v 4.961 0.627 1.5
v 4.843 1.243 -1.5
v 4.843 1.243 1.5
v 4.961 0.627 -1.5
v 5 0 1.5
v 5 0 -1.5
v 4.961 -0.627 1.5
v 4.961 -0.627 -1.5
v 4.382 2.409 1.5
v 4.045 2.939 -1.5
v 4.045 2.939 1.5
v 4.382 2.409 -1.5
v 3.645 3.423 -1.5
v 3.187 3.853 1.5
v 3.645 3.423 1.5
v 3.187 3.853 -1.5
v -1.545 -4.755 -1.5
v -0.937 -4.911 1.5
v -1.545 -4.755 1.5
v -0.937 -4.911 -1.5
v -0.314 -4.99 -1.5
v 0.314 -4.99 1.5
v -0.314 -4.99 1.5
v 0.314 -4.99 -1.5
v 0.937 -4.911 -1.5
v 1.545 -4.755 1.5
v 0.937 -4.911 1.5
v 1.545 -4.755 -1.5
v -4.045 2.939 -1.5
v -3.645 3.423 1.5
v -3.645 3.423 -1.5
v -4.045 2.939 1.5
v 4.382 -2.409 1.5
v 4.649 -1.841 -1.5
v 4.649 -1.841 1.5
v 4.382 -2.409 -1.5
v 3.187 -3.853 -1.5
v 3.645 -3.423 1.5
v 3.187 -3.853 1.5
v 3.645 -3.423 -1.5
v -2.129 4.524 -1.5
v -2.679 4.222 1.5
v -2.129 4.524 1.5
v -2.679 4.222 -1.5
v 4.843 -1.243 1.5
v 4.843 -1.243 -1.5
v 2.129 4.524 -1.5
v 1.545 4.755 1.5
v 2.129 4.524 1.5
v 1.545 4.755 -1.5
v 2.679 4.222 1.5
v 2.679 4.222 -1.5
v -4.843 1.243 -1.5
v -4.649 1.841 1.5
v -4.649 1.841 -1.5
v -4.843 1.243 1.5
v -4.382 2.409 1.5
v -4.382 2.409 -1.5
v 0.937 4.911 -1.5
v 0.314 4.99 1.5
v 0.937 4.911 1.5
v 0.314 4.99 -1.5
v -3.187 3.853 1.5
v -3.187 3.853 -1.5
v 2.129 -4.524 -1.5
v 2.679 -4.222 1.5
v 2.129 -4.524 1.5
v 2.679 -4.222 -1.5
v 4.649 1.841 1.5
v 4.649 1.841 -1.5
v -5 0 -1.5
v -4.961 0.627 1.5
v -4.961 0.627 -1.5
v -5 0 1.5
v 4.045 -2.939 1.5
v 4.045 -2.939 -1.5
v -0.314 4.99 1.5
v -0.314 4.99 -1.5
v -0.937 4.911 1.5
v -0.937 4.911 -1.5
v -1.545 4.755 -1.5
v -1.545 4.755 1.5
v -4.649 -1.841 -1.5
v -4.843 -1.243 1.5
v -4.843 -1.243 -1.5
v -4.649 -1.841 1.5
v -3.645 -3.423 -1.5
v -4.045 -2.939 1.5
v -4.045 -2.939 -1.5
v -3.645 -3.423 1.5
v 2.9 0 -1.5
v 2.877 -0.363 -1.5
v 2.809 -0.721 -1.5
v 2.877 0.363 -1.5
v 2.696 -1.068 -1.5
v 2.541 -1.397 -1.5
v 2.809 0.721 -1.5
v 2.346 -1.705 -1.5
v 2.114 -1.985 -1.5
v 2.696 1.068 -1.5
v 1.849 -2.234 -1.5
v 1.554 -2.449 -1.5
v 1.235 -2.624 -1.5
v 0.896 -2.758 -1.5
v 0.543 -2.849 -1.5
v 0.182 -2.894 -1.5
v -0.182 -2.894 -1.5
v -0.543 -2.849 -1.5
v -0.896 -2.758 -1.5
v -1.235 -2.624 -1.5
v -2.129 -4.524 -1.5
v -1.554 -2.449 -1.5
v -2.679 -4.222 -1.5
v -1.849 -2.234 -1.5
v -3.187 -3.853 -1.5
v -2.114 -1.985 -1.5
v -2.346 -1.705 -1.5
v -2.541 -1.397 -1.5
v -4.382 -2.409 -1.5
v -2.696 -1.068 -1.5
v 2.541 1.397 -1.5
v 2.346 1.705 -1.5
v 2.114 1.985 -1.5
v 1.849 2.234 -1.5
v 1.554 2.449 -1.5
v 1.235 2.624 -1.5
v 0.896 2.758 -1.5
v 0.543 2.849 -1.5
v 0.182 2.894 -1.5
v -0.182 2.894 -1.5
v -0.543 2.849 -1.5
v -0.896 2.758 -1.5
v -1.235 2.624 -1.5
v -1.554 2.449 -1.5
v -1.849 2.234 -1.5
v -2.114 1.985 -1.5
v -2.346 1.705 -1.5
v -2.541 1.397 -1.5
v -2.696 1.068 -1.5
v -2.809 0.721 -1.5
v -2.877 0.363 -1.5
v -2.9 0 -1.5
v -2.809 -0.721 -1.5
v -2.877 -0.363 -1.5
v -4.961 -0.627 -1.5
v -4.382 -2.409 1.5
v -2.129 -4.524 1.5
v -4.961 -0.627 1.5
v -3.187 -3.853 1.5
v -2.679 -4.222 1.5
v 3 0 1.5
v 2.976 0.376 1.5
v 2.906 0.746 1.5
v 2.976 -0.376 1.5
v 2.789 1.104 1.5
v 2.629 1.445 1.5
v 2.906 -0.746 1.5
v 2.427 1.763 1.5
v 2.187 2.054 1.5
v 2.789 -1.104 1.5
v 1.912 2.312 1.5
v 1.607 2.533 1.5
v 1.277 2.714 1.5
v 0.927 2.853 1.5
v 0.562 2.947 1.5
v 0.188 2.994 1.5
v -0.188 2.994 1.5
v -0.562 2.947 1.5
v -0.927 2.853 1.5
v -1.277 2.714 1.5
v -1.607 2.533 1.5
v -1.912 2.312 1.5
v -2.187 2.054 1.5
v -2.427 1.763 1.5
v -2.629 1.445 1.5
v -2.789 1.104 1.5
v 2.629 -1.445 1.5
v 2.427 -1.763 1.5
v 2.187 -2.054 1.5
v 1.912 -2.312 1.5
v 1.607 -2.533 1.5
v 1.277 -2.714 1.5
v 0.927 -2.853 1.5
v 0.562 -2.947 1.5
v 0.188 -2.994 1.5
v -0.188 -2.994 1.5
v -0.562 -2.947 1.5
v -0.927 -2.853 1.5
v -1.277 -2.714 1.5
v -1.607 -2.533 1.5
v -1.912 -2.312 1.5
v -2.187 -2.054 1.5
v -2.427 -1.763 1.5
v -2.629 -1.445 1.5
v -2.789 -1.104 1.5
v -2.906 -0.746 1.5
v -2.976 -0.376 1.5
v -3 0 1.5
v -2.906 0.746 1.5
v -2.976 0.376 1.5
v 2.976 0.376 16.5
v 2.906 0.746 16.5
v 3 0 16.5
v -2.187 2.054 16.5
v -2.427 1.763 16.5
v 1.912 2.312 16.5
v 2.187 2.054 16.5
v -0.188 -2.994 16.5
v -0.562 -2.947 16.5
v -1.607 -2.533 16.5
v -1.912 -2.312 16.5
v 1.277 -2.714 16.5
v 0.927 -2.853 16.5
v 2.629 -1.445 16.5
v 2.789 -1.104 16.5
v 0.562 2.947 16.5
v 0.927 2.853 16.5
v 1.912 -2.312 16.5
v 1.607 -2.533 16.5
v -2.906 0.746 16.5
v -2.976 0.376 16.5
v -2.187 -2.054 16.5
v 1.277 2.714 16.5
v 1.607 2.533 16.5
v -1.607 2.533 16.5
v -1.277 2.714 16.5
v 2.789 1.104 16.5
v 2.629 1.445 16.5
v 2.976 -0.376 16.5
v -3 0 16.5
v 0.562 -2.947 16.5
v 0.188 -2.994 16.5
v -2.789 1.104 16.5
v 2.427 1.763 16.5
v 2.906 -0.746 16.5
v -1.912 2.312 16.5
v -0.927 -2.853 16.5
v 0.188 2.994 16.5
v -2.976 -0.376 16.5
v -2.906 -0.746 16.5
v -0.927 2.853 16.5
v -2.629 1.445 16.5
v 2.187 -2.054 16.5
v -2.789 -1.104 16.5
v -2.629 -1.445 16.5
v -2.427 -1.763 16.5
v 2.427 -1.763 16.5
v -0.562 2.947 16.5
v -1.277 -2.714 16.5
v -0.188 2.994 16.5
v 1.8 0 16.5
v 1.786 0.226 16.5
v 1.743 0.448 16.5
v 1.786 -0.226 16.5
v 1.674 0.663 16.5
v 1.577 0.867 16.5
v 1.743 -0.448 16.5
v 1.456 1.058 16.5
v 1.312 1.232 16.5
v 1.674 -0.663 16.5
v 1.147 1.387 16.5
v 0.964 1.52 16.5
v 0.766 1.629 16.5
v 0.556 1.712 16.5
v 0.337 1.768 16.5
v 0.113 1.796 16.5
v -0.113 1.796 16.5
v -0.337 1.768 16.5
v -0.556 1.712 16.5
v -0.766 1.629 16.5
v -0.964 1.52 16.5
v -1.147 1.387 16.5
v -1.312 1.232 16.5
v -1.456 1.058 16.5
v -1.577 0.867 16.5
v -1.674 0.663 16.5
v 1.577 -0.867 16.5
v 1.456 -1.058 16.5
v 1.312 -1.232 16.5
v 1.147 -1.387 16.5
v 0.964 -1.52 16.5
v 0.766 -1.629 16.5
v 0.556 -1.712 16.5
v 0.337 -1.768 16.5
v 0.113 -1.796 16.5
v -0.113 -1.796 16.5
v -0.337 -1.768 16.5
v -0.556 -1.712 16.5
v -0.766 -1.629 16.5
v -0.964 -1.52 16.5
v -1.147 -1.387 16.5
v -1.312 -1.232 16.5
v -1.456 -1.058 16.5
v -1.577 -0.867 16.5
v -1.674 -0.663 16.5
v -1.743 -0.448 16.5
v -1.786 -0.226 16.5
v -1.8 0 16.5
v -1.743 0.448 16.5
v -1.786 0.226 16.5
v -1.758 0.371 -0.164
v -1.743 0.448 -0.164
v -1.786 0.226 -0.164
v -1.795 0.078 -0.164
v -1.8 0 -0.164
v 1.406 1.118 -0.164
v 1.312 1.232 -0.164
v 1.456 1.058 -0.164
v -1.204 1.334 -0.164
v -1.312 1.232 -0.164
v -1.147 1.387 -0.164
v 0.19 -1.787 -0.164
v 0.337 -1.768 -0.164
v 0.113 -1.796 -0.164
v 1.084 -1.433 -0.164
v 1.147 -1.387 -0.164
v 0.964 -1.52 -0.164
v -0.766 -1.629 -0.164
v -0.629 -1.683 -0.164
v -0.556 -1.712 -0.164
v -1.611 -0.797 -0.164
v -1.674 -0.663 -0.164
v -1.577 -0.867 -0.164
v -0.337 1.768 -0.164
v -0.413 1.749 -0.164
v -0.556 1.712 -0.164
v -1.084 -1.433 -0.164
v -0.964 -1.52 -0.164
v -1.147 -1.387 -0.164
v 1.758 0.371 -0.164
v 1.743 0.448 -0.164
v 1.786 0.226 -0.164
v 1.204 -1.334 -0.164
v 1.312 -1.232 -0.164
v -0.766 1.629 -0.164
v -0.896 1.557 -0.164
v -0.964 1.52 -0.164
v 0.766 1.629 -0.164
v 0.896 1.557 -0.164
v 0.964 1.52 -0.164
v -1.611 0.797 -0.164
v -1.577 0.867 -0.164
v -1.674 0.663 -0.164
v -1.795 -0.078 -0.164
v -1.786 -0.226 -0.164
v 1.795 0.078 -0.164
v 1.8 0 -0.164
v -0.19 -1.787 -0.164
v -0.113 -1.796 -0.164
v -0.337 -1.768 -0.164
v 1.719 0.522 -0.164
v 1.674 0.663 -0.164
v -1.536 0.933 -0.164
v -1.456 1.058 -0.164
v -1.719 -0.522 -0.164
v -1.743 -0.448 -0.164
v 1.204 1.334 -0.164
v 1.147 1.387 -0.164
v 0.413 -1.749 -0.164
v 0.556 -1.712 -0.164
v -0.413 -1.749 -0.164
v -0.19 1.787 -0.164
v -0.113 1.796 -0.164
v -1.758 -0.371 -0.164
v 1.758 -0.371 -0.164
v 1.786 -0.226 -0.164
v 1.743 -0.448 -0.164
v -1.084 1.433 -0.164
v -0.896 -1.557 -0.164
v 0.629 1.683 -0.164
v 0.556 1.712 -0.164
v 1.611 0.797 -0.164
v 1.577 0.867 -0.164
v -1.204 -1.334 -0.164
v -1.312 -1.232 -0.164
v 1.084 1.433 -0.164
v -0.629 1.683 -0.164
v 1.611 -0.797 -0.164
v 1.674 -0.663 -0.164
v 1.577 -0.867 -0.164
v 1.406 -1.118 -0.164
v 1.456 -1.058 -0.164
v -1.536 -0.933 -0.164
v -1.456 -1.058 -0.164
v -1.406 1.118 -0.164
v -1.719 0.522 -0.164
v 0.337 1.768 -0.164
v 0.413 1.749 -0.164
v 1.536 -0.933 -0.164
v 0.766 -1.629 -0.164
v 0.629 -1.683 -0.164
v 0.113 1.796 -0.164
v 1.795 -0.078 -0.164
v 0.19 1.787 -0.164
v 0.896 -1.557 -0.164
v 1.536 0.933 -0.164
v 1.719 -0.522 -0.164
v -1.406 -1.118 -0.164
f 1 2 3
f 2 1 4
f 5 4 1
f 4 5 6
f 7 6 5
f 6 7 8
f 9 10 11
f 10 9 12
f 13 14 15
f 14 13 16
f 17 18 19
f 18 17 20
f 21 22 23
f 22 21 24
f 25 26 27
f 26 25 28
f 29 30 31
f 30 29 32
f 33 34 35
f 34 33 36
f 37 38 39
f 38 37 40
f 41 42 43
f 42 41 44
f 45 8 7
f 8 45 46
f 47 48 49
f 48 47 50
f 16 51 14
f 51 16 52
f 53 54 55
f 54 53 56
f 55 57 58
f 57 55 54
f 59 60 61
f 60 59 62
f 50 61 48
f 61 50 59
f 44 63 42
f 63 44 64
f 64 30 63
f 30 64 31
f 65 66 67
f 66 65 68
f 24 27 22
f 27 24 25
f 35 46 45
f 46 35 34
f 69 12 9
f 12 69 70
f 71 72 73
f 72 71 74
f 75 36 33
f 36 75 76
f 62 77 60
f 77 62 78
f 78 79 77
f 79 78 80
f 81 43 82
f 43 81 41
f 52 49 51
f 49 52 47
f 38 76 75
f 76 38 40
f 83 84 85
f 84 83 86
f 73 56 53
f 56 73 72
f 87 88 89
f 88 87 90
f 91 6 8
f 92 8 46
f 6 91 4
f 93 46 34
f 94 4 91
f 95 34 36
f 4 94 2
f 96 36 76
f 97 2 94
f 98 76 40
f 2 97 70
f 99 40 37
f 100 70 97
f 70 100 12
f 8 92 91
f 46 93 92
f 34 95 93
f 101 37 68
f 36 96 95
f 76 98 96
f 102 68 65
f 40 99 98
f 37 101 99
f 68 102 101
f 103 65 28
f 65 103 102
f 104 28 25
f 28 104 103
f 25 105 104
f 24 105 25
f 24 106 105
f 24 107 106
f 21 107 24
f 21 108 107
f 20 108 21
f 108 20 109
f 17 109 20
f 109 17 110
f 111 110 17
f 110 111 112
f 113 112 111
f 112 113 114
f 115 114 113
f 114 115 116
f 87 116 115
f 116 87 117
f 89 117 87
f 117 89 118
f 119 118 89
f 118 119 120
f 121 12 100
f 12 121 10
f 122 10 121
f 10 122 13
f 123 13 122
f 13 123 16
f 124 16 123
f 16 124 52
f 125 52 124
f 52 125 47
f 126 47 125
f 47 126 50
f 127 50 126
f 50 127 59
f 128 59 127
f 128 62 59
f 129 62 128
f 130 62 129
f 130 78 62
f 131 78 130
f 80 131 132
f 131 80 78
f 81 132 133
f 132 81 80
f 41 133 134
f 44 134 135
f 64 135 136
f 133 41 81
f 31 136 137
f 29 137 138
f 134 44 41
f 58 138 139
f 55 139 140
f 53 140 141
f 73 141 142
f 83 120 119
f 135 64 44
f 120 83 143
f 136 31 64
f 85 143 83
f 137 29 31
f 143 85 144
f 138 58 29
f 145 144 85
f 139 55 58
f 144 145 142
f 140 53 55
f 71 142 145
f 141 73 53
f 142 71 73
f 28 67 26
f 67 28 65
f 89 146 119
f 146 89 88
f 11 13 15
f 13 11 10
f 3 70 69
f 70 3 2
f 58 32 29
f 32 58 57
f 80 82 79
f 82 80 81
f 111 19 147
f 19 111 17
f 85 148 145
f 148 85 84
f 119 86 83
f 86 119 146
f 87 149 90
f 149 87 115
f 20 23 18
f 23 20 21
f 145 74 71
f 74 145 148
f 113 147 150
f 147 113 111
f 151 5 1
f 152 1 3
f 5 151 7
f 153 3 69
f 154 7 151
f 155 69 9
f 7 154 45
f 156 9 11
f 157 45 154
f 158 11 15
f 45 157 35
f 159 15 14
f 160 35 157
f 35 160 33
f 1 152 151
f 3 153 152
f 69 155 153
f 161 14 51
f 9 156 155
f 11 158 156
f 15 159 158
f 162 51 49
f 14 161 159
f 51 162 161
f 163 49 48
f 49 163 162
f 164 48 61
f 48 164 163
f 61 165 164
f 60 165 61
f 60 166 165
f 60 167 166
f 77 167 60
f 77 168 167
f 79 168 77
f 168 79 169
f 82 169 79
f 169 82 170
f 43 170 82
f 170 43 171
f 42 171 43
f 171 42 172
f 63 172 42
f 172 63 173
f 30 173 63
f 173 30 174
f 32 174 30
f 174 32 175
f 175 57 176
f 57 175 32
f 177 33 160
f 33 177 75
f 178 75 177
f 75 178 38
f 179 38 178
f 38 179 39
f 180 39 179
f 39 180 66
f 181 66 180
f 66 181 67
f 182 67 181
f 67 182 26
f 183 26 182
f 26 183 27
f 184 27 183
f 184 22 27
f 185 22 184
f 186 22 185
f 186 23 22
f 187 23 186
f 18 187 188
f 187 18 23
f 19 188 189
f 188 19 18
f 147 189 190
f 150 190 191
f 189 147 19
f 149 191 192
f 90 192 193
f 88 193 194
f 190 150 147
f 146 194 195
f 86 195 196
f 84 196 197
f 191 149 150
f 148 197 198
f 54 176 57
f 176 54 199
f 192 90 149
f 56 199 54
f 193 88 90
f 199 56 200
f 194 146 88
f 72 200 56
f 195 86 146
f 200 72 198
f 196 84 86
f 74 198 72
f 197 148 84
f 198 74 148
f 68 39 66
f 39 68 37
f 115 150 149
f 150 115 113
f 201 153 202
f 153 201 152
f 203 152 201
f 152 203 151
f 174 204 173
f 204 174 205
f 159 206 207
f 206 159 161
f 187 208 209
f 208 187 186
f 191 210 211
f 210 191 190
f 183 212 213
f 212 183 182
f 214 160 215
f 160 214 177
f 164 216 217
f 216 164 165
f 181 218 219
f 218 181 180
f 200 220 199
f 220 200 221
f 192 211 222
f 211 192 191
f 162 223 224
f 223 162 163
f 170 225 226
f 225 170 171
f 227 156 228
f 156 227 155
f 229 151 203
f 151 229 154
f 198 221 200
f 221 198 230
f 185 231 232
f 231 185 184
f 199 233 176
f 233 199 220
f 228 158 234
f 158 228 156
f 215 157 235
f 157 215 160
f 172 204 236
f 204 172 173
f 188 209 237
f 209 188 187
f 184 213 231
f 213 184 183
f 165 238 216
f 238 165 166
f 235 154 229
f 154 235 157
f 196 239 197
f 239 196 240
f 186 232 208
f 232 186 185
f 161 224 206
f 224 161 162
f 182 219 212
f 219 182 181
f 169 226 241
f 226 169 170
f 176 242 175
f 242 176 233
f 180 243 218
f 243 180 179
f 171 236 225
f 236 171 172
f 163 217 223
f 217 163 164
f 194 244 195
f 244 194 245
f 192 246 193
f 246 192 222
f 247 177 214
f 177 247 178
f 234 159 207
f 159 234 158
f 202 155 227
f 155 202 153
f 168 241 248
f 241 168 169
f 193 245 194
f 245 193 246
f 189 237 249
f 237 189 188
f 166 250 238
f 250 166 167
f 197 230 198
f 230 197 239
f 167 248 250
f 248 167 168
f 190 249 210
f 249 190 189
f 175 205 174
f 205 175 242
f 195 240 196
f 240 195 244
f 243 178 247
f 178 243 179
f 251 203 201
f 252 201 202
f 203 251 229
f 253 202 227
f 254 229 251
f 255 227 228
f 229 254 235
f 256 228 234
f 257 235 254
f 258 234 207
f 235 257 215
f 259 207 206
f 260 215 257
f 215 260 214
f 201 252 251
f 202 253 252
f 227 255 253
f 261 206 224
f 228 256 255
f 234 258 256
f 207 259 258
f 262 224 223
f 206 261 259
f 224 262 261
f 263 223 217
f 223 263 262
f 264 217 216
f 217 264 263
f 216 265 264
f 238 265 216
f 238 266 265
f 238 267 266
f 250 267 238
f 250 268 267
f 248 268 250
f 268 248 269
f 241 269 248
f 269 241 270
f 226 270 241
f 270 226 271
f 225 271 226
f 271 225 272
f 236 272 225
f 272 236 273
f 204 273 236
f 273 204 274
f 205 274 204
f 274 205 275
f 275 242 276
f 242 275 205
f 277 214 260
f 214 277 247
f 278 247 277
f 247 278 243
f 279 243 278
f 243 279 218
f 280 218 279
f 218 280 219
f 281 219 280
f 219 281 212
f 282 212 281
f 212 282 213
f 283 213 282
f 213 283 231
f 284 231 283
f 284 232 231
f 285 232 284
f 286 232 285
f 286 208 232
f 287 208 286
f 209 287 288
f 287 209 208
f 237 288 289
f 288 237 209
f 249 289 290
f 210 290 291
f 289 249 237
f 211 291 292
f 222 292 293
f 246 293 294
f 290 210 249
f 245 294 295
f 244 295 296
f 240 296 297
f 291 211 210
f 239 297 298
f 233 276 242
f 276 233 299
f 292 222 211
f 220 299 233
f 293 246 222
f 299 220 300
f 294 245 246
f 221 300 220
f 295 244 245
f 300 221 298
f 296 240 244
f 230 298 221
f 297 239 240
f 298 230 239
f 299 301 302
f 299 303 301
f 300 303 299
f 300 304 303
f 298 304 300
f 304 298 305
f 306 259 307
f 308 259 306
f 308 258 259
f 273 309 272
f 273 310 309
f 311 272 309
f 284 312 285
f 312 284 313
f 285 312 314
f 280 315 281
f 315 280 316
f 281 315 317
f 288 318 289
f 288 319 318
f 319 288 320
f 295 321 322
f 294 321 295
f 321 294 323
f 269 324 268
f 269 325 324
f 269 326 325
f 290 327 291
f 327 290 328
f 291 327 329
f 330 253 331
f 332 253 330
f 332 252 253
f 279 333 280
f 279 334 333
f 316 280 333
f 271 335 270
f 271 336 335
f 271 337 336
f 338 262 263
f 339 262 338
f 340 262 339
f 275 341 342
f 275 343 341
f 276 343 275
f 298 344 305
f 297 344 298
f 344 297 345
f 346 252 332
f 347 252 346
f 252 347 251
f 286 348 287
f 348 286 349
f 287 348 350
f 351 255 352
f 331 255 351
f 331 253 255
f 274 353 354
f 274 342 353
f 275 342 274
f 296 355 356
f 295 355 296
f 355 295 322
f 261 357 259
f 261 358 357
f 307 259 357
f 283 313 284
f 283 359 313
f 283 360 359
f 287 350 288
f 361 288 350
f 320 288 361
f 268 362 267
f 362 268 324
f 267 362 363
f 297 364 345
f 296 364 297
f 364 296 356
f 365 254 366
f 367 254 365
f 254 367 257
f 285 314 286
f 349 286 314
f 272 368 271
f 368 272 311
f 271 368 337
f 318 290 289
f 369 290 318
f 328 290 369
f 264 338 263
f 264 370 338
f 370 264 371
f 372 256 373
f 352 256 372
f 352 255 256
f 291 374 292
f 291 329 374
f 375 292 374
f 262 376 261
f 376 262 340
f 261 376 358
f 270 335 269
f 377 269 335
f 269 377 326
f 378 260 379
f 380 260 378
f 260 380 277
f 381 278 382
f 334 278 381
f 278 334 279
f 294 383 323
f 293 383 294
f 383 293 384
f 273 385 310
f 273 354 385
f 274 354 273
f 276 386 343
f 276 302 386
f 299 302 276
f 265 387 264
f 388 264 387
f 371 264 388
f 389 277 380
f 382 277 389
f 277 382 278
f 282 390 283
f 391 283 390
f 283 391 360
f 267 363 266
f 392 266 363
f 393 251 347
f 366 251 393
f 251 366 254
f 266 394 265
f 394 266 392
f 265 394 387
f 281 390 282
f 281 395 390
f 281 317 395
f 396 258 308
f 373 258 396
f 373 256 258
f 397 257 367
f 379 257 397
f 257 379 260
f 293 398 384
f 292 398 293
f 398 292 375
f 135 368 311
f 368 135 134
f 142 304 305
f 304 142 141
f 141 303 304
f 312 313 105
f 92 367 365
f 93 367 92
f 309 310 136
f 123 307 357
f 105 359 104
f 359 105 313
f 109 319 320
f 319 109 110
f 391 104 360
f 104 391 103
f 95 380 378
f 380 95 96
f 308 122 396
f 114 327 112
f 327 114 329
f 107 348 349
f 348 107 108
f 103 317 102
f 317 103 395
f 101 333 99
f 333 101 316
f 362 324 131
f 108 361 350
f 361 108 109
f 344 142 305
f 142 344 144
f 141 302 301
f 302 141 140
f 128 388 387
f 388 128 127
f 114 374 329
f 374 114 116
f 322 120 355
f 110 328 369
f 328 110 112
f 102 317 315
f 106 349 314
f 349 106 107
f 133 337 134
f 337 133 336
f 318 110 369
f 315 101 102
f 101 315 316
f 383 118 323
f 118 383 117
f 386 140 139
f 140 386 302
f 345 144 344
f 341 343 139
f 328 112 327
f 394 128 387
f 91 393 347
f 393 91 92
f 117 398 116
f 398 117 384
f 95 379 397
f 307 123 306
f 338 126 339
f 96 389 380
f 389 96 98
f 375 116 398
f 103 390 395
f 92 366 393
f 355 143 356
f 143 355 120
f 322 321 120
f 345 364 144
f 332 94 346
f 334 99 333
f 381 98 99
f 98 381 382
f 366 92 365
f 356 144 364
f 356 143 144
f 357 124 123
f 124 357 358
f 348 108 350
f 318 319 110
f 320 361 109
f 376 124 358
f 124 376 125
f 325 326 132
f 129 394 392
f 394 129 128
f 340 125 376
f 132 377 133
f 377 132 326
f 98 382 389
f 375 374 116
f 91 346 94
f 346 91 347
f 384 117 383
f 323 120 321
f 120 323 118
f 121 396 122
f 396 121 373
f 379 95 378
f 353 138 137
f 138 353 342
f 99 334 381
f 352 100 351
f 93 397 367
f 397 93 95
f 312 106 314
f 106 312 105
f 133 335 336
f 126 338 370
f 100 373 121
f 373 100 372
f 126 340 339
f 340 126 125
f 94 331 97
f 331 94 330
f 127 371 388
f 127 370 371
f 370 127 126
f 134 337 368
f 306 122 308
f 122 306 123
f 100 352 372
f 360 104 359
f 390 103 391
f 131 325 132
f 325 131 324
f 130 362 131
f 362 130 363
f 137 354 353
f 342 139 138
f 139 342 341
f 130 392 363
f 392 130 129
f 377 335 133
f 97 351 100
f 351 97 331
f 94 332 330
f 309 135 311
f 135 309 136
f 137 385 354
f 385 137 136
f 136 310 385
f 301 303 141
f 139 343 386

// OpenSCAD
$fn = 50;


difference() {
	union() {
		translate(v = [0, 0, -1.5000000000]) {
			cylinder(h = 3, r = 5.0000000000);
		}
		translate(v = [0, 0, -1.5000000000]) {
			cylinder(h = 18, r = 3.0000000000);
		}
	}
	union() {
		translate(v = [0, 0, -1.5000000000]) {
			rotate(a = [0, 180, 0]) {
				difference() {
					union() {
						translate(v = [0, 0, -18.0000000000]) {
							cylinder(h = 18, r = 1.5000000000);
						}
						translate(v = [0, 0, -18.0000000000]) {
							cylinder(h = 18, r = 1.8000000000);
						}
						translate(v = [0, 0, -1.7000000000]) {
							cylinder(h = 1.7000000000, r1 = 1.5000000000, r2 = 2.9000000000);
						}
						translate(v = [0, 0, -18.0000000000]) {
							cylinder(h = 18, r = 1.5000000000);
						}
					}
					union();
				}
			}
		}
		translate(v = [0, 0, -50.0000000000]) {
			cylinder(h = 100, r = 1.5000000000);
		}
	}
}
